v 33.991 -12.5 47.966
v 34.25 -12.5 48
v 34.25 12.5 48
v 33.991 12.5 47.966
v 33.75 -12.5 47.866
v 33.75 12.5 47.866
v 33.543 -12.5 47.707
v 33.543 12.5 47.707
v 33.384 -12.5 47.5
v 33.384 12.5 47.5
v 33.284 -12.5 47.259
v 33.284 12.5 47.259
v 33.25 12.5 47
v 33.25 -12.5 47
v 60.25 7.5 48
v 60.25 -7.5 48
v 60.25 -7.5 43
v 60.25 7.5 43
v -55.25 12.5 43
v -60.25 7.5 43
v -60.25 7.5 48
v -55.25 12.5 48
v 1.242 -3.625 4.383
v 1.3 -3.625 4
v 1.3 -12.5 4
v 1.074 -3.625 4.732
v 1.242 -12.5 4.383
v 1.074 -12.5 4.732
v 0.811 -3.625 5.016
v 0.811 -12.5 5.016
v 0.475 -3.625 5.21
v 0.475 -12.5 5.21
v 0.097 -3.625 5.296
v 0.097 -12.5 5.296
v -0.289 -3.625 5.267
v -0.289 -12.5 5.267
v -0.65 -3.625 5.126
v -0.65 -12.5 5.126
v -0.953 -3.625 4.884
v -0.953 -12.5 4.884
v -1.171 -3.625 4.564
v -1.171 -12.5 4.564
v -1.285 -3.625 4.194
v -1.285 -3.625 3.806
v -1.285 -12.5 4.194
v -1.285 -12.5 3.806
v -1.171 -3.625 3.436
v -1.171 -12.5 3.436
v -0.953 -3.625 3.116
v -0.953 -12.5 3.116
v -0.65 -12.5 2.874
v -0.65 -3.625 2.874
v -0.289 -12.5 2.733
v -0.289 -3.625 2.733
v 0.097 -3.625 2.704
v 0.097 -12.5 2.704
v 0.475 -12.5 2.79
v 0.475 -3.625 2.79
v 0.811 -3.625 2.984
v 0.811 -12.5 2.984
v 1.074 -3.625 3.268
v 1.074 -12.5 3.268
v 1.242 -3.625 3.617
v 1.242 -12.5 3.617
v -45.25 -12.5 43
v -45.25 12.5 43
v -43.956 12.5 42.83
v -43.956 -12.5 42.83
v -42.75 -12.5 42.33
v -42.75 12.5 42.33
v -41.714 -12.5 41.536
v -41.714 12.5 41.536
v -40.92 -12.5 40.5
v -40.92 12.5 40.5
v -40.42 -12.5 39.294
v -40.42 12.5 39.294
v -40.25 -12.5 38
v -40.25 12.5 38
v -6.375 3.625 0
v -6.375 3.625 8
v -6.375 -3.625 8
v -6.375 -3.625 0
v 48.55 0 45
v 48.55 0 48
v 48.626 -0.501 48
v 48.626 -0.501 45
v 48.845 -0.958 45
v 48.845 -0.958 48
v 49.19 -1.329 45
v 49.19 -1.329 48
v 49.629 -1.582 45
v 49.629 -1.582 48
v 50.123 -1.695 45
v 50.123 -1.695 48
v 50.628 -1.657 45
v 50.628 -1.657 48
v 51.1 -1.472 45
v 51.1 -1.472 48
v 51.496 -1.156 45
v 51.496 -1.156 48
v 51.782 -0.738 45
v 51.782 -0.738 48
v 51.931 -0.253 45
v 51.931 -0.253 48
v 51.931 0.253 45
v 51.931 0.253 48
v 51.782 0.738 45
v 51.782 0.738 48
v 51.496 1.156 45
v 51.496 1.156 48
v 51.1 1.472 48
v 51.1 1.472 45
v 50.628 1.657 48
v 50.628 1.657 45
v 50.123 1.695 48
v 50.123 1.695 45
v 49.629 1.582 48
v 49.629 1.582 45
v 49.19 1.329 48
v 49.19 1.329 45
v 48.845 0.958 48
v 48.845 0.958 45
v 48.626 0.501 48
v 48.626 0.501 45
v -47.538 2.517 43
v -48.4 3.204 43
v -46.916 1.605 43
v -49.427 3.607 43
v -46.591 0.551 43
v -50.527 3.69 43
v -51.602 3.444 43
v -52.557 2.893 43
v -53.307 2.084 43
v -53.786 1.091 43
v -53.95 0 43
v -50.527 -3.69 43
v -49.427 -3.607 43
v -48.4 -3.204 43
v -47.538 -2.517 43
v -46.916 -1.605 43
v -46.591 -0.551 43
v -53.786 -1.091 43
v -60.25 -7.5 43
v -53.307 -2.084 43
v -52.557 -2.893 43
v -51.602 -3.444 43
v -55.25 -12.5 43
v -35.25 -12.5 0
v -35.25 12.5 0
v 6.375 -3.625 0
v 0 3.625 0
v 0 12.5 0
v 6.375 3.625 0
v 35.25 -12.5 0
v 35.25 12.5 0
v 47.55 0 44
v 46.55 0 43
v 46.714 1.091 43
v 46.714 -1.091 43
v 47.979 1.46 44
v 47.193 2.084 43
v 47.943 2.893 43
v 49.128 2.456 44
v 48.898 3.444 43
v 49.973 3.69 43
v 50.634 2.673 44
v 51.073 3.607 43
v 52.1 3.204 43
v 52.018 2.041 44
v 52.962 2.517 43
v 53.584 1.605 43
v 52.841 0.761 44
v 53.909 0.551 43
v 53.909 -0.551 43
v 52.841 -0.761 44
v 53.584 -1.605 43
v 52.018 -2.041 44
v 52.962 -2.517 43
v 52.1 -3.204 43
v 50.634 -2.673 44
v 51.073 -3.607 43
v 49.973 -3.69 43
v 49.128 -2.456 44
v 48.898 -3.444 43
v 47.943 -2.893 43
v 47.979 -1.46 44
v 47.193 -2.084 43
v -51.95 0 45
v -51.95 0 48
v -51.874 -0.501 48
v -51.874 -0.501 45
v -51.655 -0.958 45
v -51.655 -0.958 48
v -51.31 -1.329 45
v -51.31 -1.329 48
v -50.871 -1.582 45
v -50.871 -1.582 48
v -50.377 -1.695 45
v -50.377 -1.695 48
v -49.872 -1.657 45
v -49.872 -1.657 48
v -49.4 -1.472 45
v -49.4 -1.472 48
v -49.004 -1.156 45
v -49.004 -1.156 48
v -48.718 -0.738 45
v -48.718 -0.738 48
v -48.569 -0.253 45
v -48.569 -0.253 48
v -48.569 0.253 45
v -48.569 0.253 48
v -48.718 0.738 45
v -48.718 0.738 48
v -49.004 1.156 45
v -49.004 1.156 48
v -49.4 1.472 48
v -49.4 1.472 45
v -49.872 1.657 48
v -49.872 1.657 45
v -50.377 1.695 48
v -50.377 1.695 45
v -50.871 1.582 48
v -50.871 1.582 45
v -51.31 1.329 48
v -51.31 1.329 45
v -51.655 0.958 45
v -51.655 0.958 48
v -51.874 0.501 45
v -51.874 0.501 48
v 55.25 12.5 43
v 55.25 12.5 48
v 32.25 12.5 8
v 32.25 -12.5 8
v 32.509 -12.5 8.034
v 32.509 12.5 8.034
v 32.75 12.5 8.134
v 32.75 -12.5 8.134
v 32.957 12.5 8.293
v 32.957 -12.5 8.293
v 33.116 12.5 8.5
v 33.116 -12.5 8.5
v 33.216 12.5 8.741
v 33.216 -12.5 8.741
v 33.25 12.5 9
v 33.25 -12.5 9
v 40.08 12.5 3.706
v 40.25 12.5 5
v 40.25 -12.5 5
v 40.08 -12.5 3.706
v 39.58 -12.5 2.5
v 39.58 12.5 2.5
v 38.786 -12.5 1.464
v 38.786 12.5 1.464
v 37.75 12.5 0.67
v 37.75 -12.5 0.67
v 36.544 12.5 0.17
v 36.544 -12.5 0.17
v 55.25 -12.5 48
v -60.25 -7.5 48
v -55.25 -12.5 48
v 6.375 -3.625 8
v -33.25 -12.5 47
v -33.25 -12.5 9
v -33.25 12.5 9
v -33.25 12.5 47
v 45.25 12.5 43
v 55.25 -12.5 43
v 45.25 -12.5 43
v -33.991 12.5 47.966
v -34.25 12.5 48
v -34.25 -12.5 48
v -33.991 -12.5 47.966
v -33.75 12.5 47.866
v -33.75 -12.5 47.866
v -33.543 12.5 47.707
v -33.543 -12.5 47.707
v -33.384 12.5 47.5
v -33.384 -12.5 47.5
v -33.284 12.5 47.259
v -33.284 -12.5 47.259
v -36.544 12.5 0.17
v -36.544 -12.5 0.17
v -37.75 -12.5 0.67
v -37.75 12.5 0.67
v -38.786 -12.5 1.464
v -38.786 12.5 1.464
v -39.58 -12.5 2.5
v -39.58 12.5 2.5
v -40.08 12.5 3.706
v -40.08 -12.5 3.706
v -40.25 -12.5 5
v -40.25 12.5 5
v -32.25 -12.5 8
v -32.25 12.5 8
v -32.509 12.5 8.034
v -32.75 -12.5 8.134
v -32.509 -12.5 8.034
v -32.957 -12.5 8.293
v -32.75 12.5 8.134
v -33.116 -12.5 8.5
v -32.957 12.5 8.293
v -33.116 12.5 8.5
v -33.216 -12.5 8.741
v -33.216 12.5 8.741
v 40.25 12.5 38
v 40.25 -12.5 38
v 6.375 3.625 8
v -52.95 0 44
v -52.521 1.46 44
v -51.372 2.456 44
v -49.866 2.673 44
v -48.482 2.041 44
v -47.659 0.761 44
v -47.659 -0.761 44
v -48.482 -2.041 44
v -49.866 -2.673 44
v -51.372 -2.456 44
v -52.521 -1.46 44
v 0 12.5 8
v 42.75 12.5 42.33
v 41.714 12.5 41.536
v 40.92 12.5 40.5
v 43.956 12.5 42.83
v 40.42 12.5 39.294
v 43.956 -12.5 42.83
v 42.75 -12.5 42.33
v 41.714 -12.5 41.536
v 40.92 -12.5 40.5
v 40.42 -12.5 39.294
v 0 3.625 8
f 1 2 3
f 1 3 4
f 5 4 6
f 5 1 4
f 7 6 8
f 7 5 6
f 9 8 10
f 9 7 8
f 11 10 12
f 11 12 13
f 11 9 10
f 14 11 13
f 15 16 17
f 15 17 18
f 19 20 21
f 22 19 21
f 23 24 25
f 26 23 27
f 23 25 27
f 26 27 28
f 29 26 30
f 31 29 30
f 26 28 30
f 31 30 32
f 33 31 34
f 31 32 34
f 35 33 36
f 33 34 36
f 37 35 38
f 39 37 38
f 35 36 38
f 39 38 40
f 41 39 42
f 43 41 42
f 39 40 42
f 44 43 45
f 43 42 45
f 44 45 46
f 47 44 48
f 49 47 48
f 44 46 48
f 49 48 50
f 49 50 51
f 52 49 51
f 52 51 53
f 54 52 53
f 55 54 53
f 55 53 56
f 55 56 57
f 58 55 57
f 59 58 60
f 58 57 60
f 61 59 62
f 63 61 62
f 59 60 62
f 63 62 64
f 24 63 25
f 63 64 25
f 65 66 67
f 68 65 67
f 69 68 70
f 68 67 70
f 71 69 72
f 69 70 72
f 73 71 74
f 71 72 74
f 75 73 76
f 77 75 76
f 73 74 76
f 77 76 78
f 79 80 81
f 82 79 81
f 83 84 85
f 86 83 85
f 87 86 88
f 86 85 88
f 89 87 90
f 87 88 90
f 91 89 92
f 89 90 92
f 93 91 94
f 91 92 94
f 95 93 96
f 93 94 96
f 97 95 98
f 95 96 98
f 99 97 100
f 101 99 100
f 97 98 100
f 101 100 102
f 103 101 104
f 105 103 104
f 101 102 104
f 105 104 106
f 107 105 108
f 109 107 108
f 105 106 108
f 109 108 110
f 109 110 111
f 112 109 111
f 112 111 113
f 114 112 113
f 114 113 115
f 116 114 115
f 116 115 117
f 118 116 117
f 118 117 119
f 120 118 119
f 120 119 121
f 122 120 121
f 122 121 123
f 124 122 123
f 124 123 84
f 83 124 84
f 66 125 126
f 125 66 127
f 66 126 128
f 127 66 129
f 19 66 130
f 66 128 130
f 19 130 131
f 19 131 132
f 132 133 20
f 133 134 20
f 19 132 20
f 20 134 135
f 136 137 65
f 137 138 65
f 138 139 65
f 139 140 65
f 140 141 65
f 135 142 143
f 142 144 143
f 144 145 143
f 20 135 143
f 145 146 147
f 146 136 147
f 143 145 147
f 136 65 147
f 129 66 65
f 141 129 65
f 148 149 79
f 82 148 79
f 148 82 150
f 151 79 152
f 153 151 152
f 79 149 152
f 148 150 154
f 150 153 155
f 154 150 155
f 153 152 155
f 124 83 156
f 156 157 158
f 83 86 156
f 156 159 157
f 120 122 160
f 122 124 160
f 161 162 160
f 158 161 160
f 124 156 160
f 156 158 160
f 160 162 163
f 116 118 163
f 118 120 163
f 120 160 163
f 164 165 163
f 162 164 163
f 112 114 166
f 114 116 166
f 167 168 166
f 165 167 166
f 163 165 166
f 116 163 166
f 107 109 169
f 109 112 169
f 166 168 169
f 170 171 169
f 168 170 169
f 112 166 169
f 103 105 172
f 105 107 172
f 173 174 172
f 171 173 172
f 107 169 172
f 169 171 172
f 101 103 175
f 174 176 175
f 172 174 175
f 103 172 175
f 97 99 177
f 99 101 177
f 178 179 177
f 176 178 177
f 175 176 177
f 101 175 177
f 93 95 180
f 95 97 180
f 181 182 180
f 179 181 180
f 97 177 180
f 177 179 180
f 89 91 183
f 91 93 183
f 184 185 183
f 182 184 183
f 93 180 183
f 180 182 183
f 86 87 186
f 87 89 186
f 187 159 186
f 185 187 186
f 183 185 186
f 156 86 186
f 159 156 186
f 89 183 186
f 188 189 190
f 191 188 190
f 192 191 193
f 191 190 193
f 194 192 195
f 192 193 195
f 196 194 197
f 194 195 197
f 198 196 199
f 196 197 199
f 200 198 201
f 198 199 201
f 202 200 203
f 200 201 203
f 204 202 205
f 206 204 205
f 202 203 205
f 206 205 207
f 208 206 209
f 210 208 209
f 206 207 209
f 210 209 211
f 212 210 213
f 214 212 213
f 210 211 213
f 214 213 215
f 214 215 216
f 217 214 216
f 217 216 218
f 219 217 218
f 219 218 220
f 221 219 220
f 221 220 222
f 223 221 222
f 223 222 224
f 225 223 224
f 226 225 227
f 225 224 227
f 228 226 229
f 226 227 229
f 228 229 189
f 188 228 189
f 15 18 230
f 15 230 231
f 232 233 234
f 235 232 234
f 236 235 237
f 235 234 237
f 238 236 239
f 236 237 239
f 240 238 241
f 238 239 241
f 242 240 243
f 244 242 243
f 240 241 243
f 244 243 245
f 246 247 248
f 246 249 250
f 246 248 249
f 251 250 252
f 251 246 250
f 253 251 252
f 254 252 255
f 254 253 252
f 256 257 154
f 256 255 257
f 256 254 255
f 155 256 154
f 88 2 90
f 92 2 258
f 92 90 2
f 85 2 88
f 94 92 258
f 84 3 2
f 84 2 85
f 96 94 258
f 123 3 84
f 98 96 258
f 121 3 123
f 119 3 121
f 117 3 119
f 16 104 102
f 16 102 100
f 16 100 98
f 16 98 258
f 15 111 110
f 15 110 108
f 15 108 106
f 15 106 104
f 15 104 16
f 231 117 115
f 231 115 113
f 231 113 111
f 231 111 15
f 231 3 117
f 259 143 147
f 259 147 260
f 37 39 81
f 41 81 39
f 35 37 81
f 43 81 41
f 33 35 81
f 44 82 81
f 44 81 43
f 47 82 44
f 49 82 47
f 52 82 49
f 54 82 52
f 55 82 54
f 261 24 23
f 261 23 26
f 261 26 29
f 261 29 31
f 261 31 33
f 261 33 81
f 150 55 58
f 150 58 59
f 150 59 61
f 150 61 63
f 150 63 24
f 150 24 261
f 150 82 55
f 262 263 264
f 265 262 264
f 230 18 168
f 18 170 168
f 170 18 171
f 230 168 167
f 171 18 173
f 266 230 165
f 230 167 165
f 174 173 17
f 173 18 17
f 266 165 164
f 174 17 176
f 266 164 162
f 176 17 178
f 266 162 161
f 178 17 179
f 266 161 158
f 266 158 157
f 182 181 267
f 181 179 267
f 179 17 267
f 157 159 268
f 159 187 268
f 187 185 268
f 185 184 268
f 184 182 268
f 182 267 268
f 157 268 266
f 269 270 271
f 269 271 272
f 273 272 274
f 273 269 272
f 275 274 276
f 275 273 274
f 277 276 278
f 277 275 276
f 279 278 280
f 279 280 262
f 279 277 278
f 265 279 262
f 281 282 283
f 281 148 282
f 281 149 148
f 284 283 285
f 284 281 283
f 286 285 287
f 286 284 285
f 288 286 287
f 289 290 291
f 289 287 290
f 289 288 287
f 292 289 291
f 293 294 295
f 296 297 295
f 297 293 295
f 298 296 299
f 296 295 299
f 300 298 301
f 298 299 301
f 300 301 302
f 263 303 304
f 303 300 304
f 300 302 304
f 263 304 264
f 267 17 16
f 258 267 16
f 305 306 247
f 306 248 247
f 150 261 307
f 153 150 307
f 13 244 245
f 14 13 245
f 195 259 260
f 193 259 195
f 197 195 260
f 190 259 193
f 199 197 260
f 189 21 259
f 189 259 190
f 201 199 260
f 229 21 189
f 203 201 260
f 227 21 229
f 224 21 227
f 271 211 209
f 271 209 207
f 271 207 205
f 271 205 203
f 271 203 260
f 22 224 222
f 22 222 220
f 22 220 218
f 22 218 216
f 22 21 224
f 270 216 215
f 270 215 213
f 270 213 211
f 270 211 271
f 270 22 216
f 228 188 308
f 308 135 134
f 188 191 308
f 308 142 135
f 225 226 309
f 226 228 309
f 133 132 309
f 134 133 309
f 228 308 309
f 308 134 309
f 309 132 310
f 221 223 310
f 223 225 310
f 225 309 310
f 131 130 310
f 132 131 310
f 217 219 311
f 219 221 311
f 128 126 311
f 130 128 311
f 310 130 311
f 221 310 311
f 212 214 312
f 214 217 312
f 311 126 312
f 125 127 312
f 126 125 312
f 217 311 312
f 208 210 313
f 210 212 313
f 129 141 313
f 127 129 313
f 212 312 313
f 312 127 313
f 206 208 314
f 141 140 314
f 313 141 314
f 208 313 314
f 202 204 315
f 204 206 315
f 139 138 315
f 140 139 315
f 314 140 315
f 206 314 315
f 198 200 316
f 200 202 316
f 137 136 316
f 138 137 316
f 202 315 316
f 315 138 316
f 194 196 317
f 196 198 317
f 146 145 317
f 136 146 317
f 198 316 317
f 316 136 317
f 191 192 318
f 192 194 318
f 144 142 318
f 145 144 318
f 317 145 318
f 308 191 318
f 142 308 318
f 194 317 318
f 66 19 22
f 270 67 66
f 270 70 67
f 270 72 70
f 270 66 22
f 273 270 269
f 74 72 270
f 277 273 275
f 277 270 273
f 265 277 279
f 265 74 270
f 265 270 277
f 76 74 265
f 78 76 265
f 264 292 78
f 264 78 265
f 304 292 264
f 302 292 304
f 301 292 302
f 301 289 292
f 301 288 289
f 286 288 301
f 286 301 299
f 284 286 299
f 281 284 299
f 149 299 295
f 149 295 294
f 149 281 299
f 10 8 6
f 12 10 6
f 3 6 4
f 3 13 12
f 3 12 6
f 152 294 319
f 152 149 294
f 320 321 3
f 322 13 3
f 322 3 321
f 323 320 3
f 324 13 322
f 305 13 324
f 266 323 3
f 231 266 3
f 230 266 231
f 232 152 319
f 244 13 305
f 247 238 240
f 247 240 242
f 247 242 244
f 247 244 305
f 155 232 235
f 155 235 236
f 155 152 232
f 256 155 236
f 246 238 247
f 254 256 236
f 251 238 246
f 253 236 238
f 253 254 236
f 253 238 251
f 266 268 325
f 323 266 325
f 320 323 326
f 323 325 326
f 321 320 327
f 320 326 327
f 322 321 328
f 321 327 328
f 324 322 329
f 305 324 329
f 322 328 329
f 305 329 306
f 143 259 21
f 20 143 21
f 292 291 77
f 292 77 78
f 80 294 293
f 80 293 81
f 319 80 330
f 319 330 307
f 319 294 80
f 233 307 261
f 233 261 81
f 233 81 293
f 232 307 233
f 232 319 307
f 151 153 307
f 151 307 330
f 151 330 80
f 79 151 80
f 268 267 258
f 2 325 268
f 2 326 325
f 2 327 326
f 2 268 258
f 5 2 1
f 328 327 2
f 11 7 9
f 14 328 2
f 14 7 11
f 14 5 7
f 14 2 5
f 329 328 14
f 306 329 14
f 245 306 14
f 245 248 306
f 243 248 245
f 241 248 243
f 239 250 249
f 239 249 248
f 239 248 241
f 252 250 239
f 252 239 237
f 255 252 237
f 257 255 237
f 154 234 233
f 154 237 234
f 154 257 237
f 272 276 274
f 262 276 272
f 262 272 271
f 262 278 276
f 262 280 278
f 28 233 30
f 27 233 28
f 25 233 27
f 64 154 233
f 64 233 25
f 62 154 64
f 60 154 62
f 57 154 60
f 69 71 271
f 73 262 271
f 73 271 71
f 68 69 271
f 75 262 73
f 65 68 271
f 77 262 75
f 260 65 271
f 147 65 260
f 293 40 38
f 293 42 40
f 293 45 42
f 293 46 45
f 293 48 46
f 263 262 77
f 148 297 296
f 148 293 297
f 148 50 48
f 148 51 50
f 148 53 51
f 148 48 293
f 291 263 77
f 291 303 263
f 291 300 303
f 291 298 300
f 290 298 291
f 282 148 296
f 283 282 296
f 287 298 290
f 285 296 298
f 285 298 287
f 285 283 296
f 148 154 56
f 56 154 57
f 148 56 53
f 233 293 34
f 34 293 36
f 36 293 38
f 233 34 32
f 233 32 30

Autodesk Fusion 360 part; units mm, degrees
sketch "Sketch1" plane through (0, 0, 0) normal (0, 0, 1) x (1, 0, 0)
  line L0 (6.375, 3.625) -> (-6.375, 3.625)
  line L1 (-6.375, 3.625) -> (-6.375, -3.625)
  line L2 (-6.375, -3.625) -> (6.375, -3.625)
  line L3 (6.375, -3.625) -> (6.375, 3.625)
  line L4 (6.375, 3.625) -> (-6.375, -3.625) construction
  line L5 (-6.375, 3.625) -> (6.375, -3.625) construction
  line L6 (33.25, -12.5) -> (-33.25, -12.5)
  line L7 (-33.25, -12.5) -> (-33.25, 12.5)
  line L8 (-33.25, 12.5) -> (33.25, 12.5)
  line L9 (33.25, 12.5) -> (33.25, -12.5)
  line L10 (33.25, -12.5) -> (-33.25, 12.5) construction
  line L11 (-33.25, -12.5) -> (33.25, 12.5) construction
  line L12 (-33.25, -12.5) -> (-40.25, -12.5)
  line L13 (-40.25, -12.5) -> (-40.25, 12.5)
  line L14 (-40.25, 12.5) -> (-33.25, 12.5)
  line L15 (-33.25, 12.5) -> (-33.25, -12.5)
  line L16 (0, 1.75) -> (0, 22.5)
  line L17 (40.25, -12.5) -> (40.25, 12.5)
  line L18 (40.25, 12.5) -> (33.25, 12.5)
  line L19 (33.25, -12.5) -> (33.25, 12.5)
  line L20 (33.25, -12.5) -> (40.25, -12.5)
  dimension "d1" = 12.75
  dimension "d2" = 7.25
  dimension "d3" = 25
  dimension "d4" = 66.5
  dimension "d7" = 7
  dimension "d8" = 25
extrude "Extrude1" add sketch "Sketch1" along normal blind 8 contours L6 L7 L8 L9 L15 L19
extrude "Extrude2" add sketch "Sketch1" along normal blind 48 contours L7 L12 L13 L14 L15 | L9 L17 L18 L19 L20
sketch "Sketch2" plane through (0, 0, 48) normal (0, 0, 1) x (-1, 0, 0)
  line L0 (33.25, -12.5) -> (40.25, -12.5)
  line L1 (40.25, -12.5) -> (40.25, 12.5)
  line L2 (40.25, 12.5) -> (33.25, 12.5)
  line L3 (33.25, 12.5) -> (33.25, -12.5)
  line L4 (40.25, 12.5) -> (60.25, 12.5)
  line L5 (60.25, 12.5) -> (60.25, -12.5)
  line L6 (60.25, -12.5) -> (40.25, -12.5)
  line L7 (40.25, -12.5) -> (40.25, 12.5)
  circle A0 centre (50.25, 0) radius 1.7
  line L8 (60.25, 0) -> (40.25, 0)
  line L9 (0, -1.75) -> (0, -22.5)
  line L10 (-60.25, 12.5) -> (-60.25, -12.5)
  line L11 (-60.25, -12.5) -> (-40.25, -12.5)
  line L12 (-40.25, -12.5) -> (-40.25, 12.5)
  line L13 (-40.25, 12.5) -> (-60.25, 12.5)
  line L14 (-60.25, 0) -> (-40.25, 0)
  circle A1 centre (-50.25, 0) radius 1.7
  dimension "d11" = 20
  dimension "d12" = 3.4
  dimension "d13" = 25
extrude "Extrude3" add sketch "Sketch2" against normal blind 5 contours L1 L5 L6 L7 A0 L8 | L1 L4 L5 L7 A0 L8 | L10 L12 L13 L14 A1 | L10 L11 L12 L14 A1
chamfer "Chamfer1" distance 2 angle 45 2 edges at (-48.665, 0.6147, 43) (51.835, 0.6147, 43)
fillet "Fillet3" radius 5 4 edges at (40.25, 0, 0) (-40.25, 0, 0) (-40.25, 0, 43) (40.25, 0, 43)
fillet "Fillet4" radius 1 4 edges at (-33.25, 0, 8) (33.25, 0, 8) (33.25, 0, 48) (-33.25, 0, 48)
chamfer "Chamfer2" distance 5 angle 45 4 edges at (-60.25, 12.5, 45.5) (-60.25, -12.5, 45.5) (60.25, -12.5, 45.5) (60.25, 12.5, 45.5)
sketch "Sketch3" plane through (0, -12.5, 0) normal (0, -1, 0) x (1, 0, 0)
  line L0 (55.25, 43) -> (55.25, 48)
  line L1 (55.25, 48) -> (34.25, 48)
  arc A0 (34.25, 48) -> (33.25, 47) centre (34.25, 47) ccw
  line L2 (33.25, 47) -> (33.25, 9)
  arc A1 (32.25, 8) -> (33.25, 9) centre (32.25, 9) ccw
  line L3 (32.25, 8) -> (-32.25, 8)
  arc A2 (-33.25, 9) -> (-32.25, 8) centre (-32.25, 9) ccw
  line L4 (-33.25, 9) -> (-33.25, 47)
  arc A3 (-33.25, 47) -> (-34.25, 48) centre (-34.25, 47) ccw
  line L5 (-34.25, 48) -> (-55.25, 48)
  line L6 (-55.25, 48) -> (-55.25, 43)
  line L7 (-55.25, 43) -> (-45.25, 43)
  arc A4 (-40.25, 38) -> (-45.25, 43) centre (-45.25, 38) ccw
  line L8 (-40.25, 38) -> (-40.25, 5)
  arc A5 (-40.25, 5) -> (-35.25, 0) centre (-35.25, 5) ccw
  line L9 (-35.25, 0) -> (35.25, 0)
  arc A6 (35.25, 0) -> (40.25, 5) centre (35.25, 5) ccw
  line L10 (40.25, 5) -> (40.25, 38)
  arc A7 (45.25, 43) -> (40.25, 38) centre (45.25, 38) ccw
  line L11 (45.25, 43) -> (55.25, 43)
  line L12 (-6.375, 0) -> (6.375, 0)
  line L13 (6.375, 0) -> (6.375, 8)
  line L14 (6.375, 8) -> (-6.375, 8)
  line L15 (-6.375, 8) -> (-6.375, 0)
  line L16 (0, 4) -> (0, 0) construction
  line L17 (0, 4) -> (-6.375, 4) construction
  circle A8 centre (0, 4) radius 1.3
  dimension "d39" = 2.6
extrude "Extrude4" cut sketch "Sketch3" against normal blind 8.875 contours A8
equation "d3 = thickness"
equation "d8 = d3"
equation "d13 = thickness"
equation "thickness = 25 mm"
